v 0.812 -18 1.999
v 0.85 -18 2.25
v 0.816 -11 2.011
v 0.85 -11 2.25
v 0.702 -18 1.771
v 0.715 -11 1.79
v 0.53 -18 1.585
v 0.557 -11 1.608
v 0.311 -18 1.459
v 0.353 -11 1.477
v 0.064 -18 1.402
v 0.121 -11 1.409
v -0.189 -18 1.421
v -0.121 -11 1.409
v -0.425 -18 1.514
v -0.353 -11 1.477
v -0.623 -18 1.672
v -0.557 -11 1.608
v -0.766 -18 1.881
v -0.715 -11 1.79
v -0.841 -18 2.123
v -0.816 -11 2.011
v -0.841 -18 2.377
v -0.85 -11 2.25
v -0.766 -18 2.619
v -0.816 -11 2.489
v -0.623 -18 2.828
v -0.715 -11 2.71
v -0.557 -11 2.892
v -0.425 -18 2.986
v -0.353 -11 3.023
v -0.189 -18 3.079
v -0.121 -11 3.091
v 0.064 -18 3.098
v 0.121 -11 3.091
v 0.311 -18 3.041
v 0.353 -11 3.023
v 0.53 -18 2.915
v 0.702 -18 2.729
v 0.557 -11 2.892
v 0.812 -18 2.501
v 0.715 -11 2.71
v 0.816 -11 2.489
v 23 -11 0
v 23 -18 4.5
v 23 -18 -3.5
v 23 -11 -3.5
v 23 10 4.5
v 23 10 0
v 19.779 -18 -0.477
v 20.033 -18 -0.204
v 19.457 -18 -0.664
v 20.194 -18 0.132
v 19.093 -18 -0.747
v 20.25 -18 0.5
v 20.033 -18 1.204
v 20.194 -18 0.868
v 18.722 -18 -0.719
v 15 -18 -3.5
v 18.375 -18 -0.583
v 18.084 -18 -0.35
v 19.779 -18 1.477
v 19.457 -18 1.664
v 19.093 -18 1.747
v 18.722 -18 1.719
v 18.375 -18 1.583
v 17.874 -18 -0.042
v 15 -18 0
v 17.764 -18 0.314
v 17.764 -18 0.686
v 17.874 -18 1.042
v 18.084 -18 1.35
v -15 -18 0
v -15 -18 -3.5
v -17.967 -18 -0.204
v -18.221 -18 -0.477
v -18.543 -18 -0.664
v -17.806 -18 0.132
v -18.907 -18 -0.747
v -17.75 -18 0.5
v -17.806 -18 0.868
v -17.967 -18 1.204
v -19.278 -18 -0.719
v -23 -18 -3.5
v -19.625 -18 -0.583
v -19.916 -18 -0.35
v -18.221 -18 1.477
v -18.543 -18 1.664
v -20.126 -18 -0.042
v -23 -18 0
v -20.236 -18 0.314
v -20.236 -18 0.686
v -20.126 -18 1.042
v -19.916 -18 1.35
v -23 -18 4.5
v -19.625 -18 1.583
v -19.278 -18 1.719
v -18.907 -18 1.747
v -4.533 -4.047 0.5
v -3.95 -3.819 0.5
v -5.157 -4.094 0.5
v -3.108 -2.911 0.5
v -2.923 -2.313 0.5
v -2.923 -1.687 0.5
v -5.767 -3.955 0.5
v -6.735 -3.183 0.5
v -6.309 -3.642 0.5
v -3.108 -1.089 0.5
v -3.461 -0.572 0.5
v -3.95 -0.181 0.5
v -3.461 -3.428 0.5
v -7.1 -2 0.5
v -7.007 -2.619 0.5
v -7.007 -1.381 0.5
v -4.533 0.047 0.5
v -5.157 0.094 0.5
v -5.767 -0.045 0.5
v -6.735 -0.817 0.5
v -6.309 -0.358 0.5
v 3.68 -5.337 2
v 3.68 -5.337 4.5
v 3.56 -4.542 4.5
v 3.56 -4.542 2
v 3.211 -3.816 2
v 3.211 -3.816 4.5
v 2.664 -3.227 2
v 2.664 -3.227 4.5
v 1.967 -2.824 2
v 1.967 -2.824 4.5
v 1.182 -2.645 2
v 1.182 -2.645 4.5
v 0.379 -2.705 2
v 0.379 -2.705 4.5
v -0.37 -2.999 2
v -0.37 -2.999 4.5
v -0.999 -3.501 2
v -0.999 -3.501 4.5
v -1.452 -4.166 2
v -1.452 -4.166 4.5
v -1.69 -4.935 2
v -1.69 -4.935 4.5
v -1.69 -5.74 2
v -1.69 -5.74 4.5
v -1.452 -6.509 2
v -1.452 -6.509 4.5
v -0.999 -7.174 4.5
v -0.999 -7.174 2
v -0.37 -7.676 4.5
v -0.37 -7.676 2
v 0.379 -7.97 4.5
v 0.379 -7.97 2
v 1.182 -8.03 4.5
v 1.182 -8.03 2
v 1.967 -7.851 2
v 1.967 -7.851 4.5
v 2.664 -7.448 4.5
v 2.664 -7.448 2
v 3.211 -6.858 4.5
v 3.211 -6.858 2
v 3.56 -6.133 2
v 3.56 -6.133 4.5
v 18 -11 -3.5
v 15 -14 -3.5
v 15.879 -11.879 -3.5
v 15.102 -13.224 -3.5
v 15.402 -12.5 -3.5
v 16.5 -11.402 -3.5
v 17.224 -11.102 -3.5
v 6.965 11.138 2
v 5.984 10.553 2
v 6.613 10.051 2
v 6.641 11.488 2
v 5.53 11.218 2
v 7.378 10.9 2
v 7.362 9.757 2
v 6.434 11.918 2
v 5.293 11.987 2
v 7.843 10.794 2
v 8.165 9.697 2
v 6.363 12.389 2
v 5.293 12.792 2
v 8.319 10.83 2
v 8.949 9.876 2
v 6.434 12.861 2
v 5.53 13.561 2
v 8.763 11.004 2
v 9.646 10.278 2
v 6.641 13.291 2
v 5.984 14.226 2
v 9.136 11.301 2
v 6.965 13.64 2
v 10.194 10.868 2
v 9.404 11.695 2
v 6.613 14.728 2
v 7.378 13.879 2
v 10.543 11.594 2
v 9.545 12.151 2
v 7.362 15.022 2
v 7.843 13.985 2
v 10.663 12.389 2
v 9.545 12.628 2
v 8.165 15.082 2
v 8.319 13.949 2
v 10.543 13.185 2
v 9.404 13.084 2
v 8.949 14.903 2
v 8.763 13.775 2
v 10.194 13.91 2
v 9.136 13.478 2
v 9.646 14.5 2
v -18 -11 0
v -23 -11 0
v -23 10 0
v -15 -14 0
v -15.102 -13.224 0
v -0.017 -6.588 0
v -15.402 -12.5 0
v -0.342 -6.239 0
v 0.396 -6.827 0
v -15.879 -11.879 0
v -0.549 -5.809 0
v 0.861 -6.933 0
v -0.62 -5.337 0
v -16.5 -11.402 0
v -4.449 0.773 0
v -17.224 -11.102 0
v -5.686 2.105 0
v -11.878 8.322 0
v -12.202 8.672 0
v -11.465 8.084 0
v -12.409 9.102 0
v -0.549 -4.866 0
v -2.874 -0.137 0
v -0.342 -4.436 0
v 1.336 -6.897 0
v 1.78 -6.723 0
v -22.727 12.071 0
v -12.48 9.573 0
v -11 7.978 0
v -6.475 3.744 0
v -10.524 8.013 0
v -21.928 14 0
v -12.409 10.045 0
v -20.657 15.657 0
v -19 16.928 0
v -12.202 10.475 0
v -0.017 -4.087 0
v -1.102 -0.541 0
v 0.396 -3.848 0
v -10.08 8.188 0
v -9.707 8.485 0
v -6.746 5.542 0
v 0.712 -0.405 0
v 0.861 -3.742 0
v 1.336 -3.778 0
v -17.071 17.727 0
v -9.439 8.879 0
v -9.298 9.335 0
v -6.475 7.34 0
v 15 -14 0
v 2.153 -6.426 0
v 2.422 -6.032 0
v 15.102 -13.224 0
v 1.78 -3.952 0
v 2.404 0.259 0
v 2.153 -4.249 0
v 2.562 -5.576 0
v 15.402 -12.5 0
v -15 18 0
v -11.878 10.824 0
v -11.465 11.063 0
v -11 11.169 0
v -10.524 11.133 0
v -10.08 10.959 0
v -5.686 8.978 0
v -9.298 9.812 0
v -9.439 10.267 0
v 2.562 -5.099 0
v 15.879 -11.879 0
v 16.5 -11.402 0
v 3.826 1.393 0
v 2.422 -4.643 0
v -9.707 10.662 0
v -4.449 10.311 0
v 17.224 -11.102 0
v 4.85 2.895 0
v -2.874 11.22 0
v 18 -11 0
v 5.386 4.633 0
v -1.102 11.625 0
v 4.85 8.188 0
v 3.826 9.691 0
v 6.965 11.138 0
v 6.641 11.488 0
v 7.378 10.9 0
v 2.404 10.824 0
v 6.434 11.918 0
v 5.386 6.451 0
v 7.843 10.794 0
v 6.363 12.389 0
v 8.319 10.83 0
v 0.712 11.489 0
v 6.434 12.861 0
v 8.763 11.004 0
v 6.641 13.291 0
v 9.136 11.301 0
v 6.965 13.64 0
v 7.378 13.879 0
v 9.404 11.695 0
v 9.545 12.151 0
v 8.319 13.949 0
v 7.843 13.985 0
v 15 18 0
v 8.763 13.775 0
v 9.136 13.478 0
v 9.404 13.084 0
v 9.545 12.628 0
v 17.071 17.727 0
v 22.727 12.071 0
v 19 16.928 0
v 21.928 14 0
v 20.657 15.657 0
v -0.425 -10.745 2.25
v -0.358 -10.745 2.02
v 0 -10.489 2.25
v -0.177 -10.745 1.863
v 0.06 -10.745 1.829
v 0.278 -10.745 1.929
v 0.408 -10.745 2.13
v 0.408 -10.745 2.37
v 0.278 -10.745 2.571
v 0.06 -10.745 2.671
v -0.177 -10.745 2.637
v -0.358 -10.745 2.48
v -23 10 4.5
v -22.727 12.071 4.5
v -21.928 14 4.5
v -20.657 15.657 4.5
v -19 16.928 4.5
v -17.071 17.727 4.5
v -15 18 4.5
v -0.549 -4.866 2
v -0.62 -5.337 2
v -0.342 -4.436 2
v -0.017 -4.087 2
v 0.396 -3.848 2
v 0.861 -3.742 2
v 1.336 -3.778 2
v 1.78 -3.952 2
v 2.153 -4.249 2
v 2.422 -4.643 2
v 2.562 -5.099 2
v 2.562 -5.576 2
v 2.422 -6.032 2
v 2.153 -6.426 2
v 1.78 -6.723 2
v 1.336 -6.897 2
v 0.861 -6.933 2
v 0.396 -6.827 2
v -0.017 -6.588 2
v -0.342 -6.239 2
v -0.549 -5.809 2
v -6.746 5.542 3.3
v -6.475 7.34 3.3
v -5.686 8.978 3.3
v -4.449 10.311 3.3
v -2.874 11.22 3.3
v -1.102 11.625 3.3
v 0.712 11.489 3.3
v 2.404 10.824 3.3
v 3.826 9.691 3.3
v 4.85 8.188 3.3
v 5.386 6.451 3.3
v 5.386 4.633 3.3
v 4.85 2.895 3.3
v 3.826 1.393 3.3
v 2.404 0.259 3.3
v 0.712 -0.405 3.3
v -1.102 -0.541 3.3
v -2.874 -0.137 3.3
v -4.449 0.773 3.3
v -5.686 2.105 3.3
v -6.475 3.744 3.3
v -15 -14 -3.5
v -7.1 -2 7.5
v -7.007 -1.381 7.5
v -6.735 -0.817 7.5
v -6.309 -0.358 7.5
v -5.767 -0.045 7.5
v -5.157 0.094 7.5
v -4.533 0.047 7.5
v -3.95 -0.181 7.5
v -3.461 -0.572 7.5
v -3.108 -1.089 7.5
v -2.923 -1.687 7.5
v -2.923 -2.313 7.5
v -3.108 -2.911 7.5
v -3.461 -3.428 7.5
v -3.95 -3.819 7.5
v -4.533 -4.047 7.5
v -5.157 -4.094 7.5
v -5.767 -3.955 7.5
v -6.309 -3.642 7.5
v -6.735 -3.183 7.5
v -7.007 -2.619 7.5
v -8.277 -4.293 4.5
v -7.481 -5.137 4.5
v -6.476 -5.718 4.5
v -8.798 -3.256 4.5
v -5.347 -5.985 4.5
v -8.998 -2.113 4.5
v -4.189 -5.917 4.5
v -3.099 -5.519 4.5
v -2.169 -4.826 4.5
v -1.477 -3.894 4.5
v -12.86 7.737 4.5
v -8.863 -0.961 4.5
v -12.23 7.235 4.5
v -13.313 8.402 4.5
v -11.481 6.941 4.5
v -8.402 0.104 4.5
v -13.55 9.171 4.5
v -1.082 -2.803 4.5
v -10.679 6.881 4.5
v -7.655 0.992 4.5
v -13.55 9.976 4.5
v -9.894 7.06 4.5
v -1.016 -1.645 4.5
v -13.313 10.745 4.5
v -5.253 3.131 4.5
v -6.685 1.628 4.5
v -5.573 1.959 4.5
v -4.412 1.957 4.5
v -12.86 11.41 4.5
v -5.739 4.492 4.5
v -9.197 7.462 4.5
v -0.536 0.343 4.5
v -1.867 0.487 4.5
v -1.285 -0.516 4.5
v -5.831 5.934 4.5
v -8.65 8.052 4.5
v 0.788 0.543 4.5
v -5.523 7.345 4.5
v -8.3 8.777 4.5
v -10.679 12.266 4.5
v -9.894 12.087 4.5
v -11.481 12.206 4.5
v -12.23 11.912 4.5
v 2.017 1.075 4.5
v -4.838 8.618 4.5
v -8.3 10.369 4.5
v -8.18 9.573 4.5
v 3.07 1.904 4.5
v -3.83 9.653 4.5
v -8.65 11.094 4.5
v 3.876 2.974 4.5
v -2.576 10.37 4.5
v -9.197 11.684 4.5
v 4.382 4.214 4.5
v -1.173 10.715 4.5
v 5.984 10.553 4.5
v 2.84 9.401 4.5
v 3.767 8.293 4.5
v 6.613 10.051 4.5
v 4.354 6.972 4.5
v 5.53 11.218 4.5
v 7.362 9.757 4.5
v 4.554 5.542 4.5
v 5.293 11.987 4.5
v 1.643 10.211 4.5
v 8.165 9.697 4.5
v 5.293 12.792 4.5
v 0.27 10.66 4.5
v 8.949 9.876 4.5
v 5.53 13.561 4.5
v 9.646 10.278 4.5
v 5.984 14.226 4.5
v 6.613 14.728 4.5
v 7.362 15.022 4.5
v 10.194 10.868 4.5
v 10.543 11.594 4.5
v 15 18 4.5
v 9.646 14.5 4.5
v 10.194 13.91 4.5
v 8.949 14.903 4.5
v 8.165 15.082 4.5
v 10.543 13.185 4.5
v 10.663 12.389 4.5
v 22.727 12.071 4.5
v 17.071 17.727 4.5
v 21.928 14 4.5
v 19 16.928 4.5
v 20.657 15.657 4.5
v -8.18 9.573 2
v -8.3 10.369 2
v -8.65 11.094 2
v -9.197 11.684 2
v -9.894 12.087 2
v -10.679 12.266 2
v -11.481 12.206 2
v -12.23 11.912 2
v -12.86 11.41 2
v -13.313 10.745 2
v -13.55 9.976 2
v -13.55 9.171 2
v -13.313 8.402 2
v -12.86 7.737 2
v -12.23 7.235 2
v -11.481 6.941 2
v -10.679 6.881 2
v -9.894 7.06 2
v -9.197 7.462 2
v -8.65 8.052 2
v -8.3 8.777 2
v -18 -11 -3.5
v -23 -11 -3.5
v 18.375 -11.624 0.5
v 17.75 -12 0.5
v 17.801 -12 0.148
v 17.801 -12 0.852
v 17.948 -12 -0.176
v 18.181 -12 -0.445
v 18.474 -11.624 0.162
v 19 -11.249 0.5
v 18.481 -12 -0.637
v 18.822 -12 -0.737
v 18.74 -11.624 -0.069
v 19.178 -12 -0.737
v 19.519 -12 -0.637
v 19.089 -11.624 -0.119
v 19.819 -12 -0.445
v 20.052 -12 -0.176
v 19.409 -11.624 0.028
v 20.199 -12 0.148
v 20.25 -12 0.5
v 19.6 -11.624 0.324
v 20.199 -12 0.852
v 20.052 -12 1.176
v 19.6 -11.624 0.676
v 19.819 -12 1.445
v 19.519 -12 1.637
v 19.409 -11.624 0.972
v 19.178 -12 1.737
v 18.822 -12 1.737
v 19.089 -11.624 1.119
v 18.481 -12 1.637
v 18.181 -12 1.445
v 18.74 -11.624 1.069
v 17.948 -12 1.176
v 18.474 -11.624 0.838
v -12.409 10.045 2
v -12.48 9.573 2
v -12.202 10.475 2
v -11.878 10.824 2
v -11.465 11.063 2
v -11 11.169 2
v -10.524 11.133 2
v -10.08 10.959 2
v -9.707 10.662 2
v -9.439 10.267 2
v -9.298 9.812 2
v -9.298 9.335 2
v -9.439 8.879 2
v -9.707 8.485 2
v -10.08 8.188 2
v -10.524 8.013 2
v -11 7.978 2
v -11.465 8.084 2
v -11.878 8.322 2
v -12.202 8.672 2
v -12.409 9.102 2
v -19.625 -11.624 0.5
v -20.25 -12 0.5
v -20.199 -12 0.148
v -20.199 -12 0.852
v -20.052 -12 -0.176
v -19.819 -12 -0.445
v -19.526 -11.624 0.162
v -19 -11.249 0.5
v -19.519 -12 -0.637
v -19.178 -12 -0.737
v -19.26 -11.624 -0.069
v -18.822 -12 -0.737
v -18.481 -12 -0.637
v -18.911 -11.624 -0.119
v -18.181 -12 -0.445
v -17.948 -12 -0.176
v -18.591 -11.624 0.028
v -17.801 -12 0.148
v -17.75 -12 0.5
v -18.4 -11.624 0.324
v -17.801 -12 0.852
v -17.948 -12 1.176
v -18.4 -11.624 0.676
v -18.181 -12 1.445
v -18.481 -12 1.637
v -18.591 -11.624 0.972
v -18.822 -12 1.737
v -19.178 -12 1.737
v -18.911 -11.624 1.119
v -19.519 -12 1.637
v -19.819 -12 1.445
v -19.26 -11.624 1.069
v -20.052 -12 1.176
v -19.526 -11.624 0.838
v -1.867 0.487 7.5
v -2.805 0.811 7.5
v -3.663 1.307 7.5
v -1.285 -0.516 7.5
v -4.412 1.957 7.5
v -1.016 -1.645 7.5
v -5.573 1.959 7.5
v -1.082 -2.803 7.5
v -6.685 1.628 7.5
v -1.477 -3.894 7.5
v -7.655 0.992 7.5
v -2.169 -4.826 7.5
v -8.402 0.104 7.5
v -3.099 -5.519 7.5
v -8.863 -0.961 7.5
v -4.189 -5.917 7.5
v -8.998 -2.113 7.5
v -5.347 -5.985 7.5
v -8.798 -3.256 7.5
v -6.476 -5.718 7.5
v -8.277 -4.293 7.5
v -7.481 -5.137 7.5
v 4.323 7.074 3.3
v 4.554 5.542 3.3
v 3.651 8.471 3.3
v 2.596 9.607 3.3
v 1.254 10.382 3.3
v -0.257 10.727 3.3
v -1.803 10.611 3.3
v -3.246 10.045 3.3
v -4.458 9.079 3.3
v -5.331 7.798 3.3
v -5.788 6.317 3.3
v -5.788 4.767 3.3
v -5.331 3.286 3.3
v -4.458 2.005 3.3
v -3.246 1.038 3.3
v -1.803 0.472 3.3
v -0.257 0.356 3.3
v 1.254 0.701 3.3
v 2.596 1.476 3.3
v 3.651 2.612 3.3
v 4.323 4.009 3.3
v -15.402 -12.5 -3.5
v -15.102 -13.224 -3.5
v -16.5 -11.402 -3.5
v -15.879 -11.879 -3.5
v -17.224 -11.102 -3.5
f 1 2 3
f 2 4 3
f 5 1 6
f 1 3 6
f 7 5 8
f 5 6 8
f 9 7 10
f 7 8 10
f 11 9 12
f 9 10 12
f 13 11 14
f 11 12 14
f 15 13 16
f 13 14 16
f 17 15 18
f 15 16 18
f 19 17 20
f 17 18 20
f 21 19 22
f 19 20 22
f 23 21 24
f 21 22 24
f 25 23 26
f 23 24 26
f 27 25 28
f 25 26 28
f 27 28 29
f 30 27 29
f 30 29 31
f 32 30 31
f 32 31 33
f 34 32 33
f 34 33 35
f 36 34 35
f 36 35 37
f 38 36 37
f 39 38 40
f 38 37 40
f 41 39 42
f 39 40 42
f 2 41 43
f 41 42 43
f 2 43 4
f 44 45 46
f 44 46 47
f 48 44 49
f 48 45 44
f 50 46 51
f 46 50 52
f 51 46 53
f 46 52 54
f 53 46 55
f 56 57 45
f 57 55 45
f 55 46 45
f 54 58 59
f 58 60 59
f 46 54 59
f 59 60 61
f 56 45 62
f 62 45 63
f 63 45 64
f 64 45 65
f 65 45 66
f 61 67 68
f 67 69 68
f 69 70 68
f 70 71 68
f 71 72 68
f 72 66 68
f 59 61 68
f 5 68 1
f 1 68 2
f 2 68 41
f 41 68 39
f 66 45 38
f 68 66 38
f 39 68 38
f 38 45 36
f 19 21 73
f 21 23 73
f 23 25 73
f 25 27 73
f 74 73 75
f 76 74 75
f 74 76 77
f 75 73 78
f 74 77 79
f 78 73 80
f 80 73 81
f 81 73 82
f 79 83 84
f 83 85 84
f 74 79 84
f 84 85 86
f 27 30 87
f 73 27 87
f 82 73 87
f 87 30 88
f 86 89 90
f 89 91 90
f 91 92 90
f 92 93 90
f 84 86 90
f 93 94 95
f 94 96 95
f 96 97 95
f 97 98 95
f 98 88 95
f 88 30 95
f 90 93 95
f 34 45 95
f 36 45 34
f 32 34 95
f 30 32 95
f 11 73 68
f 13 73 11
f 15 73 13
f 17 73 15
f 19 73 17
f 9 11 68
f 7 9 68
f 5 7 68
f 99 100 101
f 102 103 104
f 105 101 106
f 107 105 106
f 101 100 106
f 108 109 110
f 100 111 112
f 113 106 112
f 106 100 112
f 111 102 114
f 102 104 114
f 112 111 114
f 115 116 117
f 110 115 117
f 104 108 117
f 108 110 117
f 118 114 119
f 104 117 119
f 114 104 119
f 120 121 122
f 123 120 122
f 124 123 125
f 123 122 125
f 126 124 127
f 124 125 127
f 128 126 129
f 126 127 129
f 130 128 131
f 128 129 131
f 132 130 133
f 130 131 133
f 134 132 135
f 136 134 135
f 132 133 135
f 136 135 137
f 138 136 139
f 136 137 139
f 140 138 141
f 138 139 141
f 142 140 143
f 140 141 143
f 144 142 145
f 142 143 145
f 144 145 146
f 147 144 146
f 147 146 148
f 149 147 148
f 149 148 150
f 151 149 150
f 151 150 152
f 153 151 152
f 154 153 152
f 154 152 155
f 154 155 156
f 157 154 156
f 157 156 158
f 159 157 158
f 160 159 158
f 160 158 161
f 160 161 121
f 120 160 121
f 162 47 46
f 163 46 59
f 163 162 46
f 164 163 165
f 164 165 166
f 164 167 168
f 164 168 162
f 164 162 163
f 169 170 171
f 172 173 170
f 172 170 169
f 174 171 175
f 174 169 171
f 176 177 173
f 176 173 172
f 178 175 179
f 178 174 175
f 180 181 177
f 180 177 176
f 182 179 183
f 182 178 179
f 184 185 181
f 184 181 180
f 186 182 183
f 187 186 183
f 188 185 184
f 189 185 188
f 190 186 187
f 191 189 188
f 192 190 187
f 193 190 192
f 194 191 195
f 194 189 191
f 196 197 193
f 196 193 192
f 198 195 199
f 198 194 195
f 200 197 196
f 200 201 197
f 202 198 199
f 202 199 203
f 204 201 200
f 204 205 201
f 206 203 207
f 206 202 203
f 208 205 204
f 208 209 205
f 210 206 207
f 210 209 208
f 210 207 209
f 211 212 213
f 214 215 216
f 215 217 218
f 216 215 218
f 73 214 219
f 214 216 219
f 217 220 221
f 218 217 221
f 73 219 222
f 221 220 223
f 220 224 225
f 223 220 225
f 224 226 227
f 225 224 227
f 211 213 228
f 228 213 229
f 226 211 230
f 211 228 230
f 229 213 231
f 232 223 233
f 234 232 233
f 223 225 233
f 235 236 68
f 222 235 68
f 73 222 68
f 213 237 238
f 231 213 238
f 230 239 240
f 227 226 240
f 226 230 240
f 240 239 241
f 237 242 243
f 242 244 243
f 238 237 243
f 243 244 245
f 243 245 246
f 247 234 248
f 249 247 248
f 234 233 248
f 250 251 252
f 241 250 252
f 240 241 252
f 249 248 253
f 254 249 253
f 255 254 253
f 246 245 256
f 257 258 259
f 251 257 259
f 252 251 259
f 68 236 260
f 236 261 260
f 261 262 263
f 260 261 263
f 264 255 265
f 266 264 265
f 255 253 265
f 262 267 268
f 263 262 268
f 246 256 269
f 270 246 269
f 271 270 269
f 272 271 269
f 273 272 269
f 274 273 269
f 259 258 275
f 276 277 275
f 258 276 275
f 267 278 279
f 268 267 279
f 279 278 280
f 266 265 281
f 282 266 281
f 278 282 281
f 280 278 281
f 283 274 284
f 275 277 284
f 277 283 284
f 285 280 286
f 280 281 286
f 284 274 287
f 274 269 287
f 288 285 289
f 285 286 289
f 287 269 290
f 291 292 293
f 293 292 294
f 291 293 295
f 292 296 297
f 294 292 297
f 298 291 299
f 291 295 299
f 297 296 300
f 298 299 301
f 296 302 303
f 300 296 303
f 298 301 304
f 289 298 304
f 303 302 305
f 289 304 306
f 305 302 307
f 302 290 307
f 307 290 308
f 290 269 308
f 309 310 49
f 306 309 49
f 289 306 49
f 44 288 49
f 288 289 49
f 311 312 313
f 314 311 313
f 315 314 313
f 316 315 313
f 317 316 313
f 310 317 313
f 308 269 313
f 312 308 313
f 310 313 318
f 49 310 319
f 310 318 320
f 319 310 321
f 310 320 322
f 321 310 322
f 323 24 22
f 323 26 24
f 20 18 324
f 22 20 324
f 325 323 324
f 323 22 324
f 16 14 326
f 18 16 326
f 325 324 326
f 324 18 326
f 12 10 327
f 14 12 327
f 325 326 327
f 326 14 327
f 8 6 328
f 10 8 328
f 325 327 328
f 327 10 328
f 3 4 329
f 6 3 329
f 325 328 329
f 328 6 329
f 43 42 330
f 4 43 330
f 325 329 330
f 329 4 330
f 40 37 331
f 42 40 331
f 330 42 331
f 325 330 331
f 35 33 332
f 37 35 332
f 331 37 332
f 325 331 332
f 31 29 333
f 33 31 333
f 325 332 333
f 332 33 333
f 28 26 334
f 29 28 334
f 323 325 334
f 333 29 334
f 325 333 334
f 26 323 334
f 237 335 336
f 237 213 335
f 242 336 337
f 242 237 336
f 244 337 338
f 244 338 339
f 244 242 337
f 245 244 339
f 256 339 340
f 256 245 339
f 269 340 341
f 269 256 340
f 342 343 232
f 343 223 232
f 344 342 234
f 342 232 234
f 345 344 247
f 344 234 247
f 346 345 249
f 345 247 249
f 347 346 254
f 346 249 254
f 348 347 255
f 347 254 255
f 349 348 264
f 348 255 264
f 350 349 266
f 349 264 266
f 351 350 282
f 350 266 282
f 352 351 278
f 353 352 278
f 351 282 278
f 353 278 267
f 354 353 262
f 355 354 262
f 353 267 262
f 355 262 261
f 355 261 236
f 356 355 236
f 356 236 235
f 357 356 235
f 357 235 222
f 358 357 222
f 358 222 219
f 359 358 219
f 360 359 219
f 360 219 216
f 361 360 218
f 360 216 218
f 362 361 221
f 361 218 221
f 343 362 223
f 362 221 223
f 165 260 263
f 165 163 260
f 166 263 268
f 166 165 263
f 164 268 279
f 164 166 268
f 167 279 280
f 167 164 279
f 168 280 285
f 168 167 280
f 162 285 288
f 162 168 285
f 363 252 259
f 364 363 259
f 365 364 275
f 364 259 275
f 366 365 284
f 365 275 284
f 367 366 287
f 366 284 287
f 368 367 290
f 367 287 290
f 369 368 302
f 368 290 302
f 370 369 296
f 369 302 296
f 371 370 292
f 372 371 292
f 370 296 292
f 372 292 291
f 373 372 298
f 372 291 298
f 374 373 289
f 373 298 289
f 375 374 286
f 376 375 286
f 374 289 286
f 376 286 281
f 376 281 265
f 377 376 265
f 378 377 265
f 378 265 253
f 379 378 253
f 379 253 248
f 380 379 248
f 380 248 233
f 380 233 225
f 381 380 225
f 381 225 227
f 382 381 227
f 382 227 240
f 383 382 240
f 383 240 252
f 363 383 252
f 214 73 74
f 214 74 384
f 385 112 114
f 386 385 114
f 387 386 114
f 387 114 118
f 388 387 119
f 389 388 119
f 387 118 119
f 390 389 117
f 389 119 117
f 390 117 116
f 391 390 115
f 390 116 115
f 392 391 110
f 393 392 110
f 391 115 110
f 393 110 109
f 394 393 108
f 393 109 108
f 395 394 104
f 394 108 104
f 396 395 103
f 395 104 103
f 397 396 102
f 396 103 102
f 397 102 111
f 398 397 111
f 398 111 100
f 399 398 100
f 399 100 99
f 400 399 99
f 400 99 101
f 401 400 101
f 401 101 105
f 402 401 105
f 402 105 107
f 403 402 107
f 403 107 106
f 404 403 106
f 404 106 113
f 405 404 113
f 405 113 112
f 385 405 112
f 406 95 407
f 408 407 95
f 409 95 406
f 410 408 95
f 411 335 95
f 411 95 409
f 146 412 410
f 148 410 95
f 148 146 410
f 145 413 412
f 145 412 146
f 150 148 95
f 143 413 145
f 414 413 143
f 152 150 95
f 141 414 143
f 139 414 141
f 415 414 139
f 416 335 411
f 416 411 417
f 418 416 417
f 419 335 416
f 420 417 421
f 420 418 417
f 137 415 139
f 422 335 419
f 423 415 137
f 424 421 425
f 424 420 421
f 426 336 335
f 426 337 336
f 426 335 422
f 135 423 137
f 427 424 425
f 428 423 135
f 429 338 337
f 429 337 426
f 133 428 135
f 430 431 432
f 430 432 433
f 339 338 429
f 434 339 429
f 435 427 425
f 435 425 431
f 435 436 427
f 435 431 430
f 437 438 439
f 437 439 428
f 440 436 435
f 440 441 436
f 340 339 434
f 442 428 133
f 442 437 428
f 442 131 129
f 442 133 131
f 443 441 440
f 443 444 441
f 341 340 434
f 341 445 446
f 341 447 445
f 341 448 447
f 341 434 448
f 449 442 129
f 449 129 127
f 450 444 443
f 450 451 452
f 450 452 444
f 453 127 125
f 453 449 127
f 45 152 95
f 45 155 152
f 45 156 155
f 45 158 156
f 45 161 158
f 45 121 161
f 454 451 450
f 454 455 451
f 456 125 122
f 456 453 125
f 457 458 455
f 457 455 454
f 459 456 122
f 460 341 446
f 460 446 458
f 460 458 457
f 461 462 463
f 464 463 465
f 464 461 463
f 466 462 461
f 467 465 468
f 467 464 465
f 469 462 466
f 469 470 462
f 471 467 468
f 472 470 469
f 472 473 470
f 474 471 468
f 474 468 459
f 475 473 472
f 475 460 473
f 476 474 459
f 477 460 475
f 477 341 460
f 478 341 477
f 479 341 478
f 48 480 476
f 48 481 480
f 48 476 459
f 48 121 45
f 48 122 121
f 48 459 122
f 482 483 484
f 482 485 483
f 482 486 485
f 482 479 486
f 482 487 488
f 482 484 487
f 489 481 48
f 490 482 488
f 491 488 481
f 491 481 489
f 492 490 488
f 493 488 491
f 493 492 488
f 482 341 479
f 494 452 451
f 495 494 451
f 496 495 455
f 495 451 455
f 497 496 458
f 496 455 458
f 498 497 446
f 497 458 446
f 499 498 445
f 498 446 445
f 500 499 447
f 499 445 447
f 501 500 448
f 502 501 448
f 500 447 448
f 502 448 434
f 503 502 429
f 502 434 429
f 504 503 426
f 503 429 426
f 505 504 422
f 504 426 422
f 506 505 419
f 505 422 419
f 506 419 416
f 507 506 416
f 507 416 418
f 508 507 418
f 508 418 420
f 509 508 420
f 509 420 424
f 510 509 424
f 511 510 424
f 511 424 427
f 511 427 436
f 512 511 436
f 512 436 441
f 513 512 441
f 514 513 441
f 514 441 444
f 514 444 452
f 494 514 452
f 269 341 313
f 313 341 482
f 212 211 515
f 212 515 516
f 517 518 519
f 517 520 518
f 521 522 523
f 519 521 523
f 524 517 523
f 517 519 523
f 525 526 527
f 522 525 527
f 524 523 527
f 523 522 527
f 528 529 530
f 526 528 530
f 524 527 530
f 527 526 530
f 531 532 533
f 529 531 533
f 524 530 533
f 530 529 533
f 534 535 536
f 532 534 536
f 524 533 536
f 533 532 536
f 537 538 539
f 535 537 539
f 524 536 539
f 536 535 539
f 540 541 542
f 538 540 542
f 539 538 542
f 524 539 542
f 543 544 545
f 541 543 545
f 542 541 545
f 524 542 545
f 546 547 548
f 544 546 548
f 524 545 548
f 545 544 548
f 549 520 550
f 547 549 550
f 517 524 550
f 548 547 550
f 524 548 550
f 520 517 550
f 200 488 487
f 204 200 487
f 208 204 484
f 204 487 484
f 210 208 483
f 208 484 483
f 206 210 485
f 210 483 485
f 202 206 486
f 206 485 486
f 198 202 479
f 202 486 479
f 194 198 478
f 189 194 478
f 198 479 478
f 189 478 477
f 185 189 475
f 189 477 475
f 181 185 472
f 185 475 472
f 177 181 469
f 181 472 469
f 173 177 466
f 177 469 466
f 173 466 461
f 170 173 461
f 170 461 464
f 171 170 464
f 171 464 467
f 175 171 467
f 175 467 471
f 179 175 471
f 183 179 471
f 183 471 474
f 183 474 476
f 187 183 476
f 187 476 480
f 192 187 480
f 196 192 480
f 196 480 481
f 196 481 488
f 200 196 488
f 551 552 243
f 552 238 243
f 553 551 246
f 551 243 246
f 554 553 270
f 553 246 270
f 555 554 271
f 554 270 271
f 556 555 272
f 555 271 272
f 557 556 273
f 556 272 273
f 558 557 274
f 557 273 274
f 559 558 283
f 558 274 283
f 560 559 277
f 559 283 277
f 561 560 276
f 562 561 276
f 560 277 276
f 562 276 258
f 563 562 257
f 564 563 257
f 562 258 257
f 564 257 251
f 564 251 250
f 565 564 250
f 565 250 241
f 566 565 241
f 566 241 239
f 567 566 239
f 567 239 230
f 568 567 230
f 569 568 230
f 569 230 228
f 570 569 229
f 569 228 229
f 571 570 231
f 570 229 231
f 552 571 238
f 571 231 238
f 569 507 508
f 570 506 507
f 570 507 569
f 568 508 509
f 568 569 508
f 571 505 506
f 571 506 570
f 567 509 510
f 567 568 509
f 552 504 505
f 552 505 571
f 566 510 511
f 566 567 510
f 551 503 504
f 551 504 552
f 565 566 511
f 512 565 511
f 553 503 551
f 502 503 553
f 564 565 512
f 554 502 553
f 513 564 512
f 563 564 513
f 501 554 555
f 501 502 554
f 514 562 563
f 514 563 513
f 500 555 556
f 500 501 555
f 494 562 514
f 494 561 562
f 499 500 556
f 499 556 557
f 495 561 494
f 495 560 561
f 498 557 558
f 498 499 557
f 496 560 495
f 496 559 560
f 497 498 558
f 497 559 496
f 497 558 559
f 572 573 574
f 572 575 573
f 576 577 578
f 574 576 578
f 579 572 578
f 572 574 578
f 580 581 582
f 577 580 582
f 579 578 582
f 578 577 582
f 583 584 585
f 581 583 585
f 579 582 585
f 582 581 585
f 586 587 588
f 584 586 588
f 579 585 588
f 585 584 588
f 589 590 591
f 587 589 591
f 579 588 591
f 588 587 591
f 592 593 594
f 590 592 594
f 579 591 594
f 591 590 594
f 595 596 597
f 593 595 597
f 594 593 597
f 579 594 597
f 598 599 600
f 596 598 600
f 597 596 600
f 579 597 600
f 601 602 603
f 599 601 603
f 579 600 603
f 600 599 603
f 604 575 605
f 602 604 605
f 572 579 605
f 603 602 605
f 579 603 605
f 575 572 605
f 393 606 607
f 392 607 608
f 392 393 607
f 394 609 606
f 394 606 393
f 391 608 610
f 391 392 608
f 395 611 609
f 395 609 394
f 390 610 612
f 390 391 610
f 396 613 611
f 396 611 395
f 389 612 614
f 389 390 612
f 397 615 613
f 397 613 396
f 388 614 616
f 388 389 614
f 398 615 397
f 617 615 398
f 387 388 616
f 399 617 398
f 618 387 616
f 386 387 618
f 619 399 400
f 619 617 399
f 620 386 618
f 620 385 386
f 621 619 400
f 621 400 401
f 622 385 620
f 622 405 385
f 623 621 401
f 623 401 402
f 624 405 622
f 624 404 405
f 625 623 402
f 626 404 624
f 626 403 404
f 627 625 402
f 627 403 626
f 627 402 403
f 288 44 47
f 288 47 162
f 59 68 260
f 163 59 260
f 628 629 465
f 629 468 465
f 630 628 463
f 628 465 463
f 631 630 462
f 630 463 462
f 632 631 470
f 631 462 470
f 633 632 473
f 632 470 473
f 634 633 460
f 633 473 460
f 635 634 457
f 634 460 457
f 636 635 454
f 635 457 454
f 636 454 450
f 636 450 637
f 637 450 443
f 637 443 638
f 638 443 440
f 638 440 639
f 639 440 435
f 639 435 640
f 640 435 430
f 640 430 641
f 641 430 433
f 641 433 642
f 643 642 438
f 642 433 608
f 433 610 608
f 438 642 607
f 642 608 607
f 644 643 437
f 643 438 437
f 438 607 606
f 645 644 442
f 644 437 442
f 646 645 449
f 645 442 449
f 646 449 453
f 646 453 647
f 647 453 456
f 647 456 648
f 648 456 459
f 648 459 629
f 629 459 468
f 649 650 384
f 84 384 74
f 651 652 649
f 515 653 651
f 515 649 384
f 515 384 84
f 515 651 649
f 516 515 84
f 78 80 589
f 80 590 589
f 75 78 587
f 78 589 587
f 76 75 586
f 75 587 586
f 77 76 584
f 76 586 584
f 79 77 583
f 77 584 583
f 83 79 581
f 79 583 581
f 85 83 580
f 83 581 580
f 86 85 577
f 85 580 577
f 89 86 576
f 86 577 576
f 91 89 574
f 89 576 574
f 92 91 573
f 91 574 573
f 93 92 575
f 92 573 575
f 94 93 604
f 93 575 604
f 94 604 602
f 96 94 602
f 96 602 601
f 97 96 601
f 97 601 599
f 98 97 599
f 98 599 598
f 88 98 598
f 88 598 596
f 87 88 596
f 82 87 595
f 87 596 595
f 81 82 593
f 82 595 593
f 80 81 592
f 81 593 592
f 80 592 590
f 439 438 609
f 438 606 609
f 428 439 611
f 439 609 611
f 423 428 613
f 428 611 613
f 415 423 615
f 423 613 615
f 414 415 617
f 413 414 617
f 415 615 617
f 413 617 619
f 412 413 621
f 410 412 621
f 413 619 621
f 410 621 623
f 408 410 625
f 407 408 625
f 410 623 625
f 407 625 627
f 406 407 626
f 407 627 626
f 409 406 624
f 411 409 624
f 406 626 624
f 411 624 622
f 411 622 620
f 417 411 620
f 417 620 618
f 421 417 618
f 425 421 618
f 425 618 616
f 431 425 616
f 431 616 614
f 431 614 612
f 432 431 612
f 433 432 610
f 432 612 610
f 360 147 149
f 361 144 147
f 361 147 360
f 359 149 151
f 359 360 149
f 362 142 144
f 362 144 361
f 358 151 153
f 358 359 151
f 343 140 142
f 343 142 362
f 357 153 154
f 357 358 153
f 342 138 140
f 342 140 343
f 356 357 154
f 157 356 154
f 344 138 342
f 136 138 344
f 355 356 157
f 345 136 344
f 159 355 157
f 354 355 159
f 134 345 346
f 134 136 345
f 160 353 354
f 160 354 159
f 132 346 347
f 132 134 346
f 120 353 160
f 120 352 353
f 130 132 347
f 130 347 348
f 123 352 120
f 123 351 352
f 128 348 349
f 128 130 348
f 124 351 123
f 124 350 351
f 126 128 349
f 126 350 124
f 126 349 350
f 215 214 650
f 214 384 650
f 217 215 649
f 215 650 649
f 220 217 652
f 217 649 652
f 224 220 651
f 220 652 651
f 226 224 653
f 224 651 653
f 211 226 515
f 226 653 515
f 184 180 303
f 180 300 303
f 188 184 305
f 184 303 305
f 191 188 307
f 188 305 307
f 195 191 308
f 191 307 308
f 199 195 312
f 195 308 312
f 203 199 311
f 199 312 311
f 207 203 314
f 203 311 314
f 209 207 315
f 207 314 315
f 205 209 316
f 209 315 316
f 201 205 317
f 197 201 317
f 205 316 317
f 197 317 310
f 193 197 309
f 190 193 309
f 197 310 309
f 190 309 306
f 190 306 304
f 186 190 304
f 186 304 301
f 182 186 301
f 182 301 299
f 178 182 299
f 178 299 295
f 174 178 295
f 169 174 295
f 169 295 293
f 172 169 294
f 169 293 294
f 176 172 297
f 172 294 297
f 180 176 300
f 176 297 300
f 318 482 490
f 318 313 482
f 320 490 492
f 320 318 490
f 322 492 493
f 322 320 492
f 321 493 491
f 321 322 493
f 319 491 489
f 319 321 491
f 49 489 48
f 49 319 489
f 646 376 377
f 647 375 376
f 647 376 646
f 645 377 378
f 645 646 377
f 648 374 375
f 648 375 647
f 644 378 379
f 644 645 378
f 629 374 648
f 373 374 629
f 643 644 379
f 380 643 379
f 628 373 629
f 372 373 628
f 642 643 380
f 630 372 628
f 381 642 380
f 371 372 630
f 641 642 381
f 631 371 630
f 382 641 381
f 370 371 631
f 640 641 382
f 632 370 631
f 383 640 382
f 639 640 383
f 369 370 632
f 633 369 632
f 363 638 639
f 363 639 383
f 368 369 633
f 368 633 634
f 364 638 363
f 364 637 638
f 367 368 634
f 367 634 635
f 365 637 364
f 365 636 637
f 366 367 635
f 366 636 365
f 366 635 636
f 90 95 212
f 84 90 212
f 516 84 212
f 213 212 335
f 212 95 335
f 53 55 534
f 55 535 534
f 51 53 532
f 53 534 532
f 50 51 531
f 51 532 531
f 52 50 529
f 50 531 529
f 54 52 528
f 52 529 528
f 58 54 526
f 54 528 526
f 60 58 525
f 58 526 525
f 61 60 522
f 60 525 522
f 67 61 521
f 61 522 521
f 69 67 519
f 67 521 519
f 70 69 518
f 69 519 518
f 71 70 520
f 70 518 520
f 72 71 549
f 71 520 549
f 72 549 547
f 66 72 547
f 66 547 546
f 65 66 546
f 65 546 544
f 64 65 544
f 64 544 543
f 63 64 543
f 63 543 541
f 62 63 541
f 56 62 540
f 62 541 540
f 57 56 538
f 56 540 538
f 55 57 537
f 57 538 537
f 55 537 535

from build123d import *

# Parameters (mm, degrees)
SKETCH1_W                                        = 46
SKETCH1_H                                        = 36
BOSS_EXTRUDE1_DEPTH                              = 4.5
SKETCH2_W                                        = 8
SKETCH2_H                                        = 7
BOSS_EXTRUDE2_DEPTH                              = 3.5
SKETCH3_W                                        = 7.999999995
SKETCH3_H                                        = 7
BOSS_EXTRUDE3_DEPTH                              = 3.5
SKETCH4_W                                        = 4
SKETCH4_H                                        = 3
F_1_7_1_7_DIAMETER_HOLE1_D                       = 1.7
F_1_7_1_7_DIAMETER_HOLE1_DEPTH                   = 7
F_1_7_1_7_DIAMETER_HOLE1_TIP                     = 0.510731526
F_2_5_2_5_DIAMETER_HOLE1_D                       = 2.5
F_2_5_2_5_DIAMETER_HOLE1_DEPTH                   = 6
F_2_5_2_5_DIAMETER_HOLE1_TIP                     = 0.751075774
HOLE1_D                                          = 10.4
HOLE1_CBORE_D                                    = 12.2
HOLE1_CBORE_DEPTH                                = 3.3
CBORE_FOR_M3_HEX_HEAD_MACHINE_SCREW1_D           = 3.2
CBORE_FOR_M3_HEX_HEAD_MACHINE_SCREW1_DEPTH       = 8.000025
CBORE_FOR_M3_HEX_HEAD_MACHINE_SCREW1_CBORE_D     = 5.4
CBORE_FOR_M3_HEX_HEAD_MACHINE_SCREW1_CBORE_DEPTH = 2.5
F_4_2_4_2_DIAMETER_HOLE1_D                       = 4.2
F_4_2_4_2_DIAMETER_HOLE1_DEPTH                   = 7
FILLET1_R                                        = 3
FILLET2_R                                        = 8


with BuildPart() as part:
    # Sketch1 → Boss-Extrude1 (new body)
    with BuildSketch(Plane.XY.offset(4.5)):
        Rectangle(SKETCH1_W, SKETCH1_H)
    extrude(amount=-BOSS_EXTRUDE1_DEPTH)

    # Sketch2 → Boss-Extrude2 (add)
    with BuildSketch(Plane(origin=(0, 0, 0), x_dir=(-1, 0, 0), z_dir=(0, 0, -1))):
        with Locations((-19, -14.5)):
            Rectangle(SKETCH2_W, SKETCH2_H)
    extrude(amount=BOSS_EXTRUDE2_DEPTH)

    # Sketch3 → Boss-Extrude3 (add)
    with BuildSketch(Plane(origin=(0, 0, 0), x_dir=(-1, 0, 0), z_dir=(0, 0, -1))):
        with Locations((19.000000003, -14.5)):
            Rectangle(SKETCH3_W, SKETCH3_H)
    extrude(amount=BOSS_EXTRUDE3_DEPTH)

    # Sketch4 → Revolve1 (revolve)
    with BuildSketch(Plane.XZ.offset(2)):
        with Locations((-3, 6)):
            Rectangle(SKETCH4_W, SKETCH4_H)
    revolve(axis=Axis((-5, -2, 7.5), (0, 0, -1)))

    # Ø1.7 (1.7) Diameter Hole1
    with Locations(Plane(origin=(0, -18, 0), x_dir=(-1, 0, 0), z_dir=(0, -1, 0))):
        with Locations((0, -2.25)):
            Hole(F_1_7_1_7_DIAMETER_HOLE1_D / 2, depth=F_1_7_1_7_DIAMETER_HOLE1_DEPTH)
            with Locations((0, 0, -(F_1_7_1_7_DIAMETER_HOLE1_DEPTH + F_1_7_1_7_DIAMETER_HOLE1_TIP / 2))):  # 118° drill point
                Cone(0, F_1_7_1_7_DIAMETER_HOLE1_D / 2, F_1_7_1_7_DIAMETER_HOLE1_TIP, mode=Mode.SUBTRACT)

    # Ø2.5 (2.5) Diameter Hole1
    with Locations(Plane(origin=(0, -18, 0), x_dir=(-1, 0, 0), z_dir=(0, -1, 0))):
        with Locations((-19, -0.5), (19, -0.5)):
            Hole(F_2_5_2_5_DIAMETER_HOLE1_D / 2, depth=F_2_5_2_5_DIAMETER_HOLE1_DEPTH)
            with Locations((0, 0, -(F_2_5_2_5_DIAMETER_HOLE1_DEPTH + F_2_5_2_5_DIAMETER_HOLE1_TIP / 2))):  # 118° drill point
                Cone(0, F_2_5_2_5_DIAMETER_HOLE1_D / 2, F_2_5_2_5_DIAMETER_HOLE1_TIP, mode=Mode.SUBTRACT)

    # Hole1 (through all)
    with Locations(Plane(origin=(0, 0, 0), x_dir=(-1, 0, 0), z_dir=(0, 0, -1))):
        with Locations((0.645780782, 5.541728913)):
            CounterBoreHole(HOLE1_D / 2, HOLE1_CBORE_D / 2, HOLE1_CBORE_DEPTH)

    # CBORE for M3 Hex Head Machine Screw1
    with Locations(Plane.XY.offset(4.5)):
        with Locations((0.980122741, -5.337445584), (7.962908944, 12.389389916), (-10.88037403, 9.573242407)):
            CounterBoreHole(CBORE_FOR_M3_HEX_HEAD_MACHINE_SCREW1_D / 2, CBORE_FOR_M3_HEX_HEAD_MACHINE_SCREW1_CBORE_D / 2, CBORE_FOR_M3_HEX_HEAD_MACHINE_SCREW1_CBORE_DEPTH, depth=CBORE_FOR_M3_HEX_HEAD_MACHINE_SCREW1_DEPTH)

    # Ø4.2 (4.2) Diameter Hole1
    with Locations(Plane.XY.offset(7.5)):
        with Locations((-5, -2)):
            Hole(F_4_2_4_2_DIAMETER_HOLE1_D / 2, depth=F_4_2_4_2_DIAMETER_HOLE1_DEPTH)

    # Fillet1
    fillet1_edges = [part.edges().sort_by_distance(p)[0] for p in [
        (-15.000000005, -11, -1.75),
        (15, -11, -1.75),
    ]]
    fillet(fillet1_edges, radius=FILLET1_R)

    # Fillet2
    fillet2_edges = [part.edges().sort_by_distance(p)[0] for p in [
        (-23, 18, 2.25),
        (23, 18, 2.25),
    ]]
    fillet(fillet2_edges, radius=FILLET2_R)


solid = part.part
